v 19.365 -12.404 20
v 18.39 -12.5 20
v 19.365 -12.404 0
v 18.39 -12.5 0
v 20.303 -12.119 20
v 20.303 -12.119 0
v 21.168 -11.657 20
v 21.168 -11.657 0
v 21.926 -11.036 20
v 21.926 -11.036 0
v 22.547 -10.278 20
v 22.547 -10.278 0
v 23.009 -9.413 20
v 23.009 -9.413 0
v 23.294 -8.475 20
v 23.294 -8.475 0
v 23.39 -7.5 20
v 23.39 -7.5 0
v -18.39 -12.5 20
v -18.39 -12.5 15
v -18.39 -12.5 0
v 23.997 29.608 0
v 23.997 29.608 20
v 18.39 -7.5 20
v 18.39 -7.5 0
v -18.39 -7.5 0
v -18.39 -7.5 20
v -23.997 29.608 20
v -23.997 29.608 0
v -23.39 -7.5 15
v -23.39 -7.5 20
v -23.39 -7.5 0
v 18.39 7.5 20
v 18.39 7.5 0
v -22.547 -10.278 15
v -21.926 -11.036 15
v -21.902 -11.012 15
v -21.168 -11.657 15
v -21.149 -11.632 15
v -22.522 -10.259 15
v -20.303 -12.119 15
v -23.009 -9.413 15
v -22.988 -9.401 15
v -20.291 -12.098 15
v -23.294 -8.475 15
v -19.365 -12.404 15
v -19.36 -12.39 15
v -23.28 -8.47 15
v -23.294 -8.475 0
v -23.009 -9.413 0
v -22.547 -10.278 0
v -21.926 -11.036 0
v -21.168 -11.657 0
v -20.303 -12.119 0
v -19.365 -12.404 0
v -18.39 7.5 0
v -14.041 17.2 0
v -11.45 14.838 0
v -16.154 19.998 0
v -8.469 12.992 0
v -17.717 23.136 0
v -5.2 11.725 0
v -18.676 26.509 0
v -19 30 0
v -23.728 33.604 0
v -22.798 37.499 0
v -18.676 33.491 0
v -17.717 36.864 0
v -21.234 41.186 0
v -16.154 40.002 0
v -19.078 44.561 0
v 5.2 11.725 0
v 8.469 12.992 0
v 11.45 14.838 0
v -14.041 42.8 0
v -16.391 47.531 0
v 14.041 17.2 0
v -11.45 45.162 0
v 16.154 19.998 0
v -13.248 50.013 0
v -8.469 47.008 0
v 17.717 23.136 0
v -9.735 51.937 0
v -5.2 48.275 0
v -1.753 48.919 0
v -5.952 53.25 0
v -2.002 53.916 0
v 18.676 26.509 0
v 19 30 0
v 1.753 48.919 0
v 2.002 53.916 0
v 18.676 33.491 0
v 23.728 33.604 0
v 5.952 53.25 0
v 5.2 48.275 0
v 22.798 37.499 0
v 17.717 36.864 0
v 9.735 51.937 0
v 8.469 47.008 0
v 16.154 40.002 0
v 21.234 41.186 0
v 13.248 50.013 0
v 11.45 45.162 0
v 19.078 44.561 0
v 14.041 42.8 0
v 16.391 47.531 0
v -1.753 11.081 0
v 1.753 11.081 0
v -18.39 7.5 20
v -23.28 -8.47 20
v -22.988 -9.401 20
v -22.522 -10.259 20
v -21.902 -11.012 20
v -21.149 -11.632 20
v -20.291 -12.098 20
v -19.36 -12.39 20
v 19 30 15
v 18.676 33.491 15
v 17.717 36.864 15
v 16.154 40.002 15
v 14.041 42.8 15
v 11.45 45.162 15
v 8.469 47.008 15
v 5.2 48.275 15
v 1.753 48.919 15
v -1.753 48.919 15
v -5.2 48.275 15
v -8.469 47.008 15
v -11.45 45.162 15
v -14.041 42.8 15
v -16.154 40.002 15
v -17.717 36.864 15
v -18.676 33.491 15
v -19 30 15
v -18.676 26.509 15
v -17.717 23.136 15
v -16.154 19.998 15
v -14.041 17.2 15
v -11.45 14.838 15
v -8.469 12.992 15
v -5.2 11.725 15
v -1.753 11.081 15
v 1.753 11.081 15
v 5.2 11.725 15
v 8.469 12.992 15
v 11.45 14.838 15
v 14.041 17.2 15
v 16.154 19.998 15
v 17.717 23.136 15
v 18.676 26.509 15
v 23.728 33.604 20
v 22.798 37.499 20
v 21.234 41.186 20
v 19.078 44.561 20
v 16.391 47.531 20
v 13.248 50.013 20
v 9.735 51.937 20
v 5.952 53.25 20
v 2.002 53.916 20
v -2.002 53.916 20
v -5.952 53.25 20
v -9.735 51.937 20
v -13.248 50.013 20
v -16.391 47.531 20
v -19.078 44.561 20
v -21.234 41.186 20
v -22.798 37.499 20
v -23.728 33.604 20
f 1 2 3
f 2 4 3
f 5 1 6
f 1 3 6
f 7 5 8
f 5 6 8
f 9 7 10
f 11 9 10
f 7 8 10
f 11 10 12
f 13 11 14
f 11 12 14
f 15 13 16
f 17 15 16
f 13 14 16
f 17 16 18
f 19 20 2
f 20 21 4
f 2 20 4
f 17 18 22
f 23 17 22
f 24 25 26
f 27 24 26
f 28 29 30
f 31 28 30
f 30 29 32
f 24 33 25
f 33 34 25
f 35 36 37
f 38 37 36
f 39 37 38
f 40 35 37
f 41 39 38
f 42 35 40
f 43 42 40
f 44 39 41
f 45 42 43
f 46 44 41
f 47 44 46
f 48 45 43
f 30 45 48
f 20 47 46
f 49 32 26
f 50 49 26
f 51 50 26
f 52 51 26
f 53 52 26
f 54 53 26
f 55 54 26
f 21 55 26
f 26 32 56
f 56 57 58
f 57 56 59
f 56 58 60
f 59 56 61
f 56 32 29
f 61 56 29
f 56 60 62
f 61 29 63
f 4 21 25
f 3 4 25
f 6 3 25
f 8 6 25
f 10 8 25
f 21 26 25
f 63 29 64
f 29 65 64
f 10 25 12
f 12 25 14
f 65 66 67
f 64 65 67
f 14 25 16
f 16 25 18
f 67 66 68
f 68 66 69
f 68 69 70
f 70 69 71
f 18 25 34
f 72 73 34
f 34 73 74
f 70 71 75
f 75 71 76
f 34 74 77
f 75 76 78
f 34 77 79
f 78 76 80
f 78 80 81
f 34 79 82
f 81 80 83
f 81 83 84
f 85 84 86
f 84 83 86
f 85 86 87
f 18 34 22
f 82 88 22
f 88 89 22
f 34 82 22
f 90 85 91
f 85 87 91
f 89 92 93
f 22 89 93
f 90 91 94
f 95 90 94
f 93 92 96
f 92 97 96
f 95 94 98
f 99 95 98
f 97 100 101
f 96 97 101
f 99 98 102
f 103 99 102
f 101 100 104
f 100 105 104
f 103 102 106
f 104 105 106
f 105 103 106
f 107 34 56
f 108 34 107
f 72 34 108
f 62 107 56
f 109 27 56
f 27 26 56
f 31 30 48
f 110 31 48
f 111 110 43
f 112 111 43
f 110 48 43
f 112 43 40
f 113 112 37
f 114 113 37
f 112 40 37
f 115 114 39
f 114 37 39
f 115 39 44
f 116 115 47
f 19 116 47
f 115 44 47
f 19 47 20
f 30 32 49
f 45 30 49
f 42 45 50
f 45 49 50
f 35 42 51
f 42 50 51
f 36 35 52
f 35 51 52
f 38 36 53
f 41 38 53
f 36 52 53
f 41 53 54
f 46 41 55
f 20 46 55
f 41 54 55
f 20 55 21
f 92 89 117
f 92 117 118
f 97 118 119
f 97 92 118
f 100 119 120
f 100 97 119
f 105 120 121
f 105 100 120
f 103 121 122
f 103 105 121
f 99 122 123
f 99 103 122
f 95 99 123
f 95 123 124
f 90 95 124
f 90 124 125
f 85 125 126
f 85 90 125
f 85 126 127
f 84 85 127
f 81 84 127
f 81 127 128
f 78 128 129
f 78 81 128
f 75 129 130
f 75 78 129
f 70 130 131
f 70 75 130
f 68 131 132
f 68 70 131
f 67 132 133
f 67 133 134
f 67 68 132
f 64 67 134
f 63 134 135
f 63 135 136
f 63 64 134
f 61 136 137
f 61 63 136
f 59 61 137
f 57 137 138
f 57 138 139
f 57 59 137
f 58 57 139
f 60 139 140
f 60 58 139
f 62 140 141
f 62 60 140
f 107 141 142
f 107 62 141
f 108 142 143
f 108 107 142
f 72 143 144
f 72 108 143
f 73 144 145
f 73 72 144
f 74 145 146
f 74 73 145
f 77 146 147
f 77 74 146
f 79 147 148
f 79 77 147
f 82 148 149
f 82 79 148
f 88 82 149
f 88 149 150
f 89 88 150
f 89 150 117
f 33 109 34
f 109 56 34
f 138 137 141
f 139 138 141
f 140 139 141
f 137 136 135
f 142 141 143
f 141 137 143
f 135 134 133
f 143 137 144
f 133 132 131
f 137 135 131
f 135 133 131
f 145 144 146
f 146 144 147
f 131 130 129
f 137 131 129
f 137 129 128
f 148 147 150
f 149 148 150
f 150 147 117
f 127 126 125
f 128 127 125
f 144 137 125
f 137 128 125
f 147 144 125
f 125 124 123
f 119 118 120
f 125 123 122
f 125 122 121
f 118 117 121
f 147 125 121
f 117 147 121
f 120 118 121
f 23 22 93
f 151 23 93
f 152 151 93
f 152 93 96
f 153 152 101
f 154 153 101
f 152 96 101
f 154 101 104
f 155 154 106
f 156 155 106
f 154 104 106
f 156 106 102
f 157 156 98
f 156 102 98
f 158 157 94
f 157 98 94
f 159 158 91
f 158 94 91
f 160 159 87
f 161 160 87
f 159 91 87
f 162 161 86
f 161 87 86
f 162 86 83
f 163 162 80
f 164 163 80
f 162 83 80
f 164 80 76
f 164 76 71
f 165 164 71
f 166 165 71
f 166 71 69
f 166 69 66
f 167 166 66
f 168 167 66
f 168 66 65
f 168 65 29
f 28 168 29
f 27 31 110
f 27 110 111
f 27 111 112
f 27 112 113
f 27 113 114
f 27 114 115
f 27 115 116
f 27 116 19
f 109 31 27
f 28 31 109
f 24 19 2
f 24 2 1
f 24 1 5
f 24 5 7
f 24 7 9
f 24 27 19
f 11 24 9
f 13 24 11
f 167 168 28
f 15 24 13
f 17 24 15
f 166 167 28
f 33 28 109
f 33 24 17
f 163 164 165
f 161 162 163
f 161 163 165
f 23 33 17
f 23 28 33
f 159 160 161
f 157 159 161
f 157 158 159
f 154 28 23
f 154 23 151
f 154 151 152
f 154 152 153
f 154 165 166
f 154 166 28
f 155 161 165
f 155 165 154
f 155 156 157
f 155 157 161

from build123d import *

# Parameters (mm, degrees)
SKETCH1_R           = 19
SKETCH1_W           = 36.78
SKETCH1_H           = 15
BOSS_EXTRUDE1_DEPTH = 15
BOSS_EXTRUDE4_DEPTH = 5


with BuildPart() as part:
    # Sketch1 → Boss-Extrude1 (new body)
    with BuildSketch(Plane.XY):
        with BuildLine():
            Line((-18.39, -12.5), (18.39, -12.5))
            ThreePointArc((18.39, -12.5), (21.925533906, -11.035533906), (23.39, -7.5))
            Line((23.39, -7.5), (23.996791899, 29.607599001))
            ThreePointArc((23.996791899, 29.607599001), (0, 54), (-23.996791899, 29.607599001))
            Line((-23.996791899, 29.607599001), (-23.39, -7.5))
            ThreePointArc((-23.39, -7.5), (-21.925533906, -11.035533906), (-18.39, -12.5))
        make_face()
        with Locations((0, 30)):
            Circle(SKETCH1_R, mode=Mode.SUBTRACT)
        Rectangle(SKETCH1_W, SKETCH1_H, mode=Mode.SUBTRACT)
    extrude(amount=BOSS_EXTRUDE1_DEPTH)

    # Sketch13 → Boss-Extrude4 (add)
    with BuildSketch(Plane.XY.offset(15)):
        with BuildLine():
            Line((-23.996791899, 29.607599001), (-23.39, -7.5))
            ThreePointArc((-23.39, -7.5), (-21.901669041, -11.011669041), (-18.39, -12.5))
            Line((-18.39, -12.5), (18.39, -12.5))
            ThreePointArc((18.39, -12.5), (21.925533906, -11.035533906), (23.39, -7.5))
            Line((23.39, -7.5), (23.996791899, 29.607599001))
            ThreePointArc((23.996791899, 29.607599001), (0, 54), (-23.996791899, 29.607599001))
        make_face()
        Polygon((-18.39, -7.5), (-18.39, 7.5), (0, 7.5), (18.39, 7.5), (18.39, -7.5), align=None, mode=Mode.SUBTRACT)
    extrude(amount=BOSS_EXTRUDE4_DEPTH)


solid = part.part
